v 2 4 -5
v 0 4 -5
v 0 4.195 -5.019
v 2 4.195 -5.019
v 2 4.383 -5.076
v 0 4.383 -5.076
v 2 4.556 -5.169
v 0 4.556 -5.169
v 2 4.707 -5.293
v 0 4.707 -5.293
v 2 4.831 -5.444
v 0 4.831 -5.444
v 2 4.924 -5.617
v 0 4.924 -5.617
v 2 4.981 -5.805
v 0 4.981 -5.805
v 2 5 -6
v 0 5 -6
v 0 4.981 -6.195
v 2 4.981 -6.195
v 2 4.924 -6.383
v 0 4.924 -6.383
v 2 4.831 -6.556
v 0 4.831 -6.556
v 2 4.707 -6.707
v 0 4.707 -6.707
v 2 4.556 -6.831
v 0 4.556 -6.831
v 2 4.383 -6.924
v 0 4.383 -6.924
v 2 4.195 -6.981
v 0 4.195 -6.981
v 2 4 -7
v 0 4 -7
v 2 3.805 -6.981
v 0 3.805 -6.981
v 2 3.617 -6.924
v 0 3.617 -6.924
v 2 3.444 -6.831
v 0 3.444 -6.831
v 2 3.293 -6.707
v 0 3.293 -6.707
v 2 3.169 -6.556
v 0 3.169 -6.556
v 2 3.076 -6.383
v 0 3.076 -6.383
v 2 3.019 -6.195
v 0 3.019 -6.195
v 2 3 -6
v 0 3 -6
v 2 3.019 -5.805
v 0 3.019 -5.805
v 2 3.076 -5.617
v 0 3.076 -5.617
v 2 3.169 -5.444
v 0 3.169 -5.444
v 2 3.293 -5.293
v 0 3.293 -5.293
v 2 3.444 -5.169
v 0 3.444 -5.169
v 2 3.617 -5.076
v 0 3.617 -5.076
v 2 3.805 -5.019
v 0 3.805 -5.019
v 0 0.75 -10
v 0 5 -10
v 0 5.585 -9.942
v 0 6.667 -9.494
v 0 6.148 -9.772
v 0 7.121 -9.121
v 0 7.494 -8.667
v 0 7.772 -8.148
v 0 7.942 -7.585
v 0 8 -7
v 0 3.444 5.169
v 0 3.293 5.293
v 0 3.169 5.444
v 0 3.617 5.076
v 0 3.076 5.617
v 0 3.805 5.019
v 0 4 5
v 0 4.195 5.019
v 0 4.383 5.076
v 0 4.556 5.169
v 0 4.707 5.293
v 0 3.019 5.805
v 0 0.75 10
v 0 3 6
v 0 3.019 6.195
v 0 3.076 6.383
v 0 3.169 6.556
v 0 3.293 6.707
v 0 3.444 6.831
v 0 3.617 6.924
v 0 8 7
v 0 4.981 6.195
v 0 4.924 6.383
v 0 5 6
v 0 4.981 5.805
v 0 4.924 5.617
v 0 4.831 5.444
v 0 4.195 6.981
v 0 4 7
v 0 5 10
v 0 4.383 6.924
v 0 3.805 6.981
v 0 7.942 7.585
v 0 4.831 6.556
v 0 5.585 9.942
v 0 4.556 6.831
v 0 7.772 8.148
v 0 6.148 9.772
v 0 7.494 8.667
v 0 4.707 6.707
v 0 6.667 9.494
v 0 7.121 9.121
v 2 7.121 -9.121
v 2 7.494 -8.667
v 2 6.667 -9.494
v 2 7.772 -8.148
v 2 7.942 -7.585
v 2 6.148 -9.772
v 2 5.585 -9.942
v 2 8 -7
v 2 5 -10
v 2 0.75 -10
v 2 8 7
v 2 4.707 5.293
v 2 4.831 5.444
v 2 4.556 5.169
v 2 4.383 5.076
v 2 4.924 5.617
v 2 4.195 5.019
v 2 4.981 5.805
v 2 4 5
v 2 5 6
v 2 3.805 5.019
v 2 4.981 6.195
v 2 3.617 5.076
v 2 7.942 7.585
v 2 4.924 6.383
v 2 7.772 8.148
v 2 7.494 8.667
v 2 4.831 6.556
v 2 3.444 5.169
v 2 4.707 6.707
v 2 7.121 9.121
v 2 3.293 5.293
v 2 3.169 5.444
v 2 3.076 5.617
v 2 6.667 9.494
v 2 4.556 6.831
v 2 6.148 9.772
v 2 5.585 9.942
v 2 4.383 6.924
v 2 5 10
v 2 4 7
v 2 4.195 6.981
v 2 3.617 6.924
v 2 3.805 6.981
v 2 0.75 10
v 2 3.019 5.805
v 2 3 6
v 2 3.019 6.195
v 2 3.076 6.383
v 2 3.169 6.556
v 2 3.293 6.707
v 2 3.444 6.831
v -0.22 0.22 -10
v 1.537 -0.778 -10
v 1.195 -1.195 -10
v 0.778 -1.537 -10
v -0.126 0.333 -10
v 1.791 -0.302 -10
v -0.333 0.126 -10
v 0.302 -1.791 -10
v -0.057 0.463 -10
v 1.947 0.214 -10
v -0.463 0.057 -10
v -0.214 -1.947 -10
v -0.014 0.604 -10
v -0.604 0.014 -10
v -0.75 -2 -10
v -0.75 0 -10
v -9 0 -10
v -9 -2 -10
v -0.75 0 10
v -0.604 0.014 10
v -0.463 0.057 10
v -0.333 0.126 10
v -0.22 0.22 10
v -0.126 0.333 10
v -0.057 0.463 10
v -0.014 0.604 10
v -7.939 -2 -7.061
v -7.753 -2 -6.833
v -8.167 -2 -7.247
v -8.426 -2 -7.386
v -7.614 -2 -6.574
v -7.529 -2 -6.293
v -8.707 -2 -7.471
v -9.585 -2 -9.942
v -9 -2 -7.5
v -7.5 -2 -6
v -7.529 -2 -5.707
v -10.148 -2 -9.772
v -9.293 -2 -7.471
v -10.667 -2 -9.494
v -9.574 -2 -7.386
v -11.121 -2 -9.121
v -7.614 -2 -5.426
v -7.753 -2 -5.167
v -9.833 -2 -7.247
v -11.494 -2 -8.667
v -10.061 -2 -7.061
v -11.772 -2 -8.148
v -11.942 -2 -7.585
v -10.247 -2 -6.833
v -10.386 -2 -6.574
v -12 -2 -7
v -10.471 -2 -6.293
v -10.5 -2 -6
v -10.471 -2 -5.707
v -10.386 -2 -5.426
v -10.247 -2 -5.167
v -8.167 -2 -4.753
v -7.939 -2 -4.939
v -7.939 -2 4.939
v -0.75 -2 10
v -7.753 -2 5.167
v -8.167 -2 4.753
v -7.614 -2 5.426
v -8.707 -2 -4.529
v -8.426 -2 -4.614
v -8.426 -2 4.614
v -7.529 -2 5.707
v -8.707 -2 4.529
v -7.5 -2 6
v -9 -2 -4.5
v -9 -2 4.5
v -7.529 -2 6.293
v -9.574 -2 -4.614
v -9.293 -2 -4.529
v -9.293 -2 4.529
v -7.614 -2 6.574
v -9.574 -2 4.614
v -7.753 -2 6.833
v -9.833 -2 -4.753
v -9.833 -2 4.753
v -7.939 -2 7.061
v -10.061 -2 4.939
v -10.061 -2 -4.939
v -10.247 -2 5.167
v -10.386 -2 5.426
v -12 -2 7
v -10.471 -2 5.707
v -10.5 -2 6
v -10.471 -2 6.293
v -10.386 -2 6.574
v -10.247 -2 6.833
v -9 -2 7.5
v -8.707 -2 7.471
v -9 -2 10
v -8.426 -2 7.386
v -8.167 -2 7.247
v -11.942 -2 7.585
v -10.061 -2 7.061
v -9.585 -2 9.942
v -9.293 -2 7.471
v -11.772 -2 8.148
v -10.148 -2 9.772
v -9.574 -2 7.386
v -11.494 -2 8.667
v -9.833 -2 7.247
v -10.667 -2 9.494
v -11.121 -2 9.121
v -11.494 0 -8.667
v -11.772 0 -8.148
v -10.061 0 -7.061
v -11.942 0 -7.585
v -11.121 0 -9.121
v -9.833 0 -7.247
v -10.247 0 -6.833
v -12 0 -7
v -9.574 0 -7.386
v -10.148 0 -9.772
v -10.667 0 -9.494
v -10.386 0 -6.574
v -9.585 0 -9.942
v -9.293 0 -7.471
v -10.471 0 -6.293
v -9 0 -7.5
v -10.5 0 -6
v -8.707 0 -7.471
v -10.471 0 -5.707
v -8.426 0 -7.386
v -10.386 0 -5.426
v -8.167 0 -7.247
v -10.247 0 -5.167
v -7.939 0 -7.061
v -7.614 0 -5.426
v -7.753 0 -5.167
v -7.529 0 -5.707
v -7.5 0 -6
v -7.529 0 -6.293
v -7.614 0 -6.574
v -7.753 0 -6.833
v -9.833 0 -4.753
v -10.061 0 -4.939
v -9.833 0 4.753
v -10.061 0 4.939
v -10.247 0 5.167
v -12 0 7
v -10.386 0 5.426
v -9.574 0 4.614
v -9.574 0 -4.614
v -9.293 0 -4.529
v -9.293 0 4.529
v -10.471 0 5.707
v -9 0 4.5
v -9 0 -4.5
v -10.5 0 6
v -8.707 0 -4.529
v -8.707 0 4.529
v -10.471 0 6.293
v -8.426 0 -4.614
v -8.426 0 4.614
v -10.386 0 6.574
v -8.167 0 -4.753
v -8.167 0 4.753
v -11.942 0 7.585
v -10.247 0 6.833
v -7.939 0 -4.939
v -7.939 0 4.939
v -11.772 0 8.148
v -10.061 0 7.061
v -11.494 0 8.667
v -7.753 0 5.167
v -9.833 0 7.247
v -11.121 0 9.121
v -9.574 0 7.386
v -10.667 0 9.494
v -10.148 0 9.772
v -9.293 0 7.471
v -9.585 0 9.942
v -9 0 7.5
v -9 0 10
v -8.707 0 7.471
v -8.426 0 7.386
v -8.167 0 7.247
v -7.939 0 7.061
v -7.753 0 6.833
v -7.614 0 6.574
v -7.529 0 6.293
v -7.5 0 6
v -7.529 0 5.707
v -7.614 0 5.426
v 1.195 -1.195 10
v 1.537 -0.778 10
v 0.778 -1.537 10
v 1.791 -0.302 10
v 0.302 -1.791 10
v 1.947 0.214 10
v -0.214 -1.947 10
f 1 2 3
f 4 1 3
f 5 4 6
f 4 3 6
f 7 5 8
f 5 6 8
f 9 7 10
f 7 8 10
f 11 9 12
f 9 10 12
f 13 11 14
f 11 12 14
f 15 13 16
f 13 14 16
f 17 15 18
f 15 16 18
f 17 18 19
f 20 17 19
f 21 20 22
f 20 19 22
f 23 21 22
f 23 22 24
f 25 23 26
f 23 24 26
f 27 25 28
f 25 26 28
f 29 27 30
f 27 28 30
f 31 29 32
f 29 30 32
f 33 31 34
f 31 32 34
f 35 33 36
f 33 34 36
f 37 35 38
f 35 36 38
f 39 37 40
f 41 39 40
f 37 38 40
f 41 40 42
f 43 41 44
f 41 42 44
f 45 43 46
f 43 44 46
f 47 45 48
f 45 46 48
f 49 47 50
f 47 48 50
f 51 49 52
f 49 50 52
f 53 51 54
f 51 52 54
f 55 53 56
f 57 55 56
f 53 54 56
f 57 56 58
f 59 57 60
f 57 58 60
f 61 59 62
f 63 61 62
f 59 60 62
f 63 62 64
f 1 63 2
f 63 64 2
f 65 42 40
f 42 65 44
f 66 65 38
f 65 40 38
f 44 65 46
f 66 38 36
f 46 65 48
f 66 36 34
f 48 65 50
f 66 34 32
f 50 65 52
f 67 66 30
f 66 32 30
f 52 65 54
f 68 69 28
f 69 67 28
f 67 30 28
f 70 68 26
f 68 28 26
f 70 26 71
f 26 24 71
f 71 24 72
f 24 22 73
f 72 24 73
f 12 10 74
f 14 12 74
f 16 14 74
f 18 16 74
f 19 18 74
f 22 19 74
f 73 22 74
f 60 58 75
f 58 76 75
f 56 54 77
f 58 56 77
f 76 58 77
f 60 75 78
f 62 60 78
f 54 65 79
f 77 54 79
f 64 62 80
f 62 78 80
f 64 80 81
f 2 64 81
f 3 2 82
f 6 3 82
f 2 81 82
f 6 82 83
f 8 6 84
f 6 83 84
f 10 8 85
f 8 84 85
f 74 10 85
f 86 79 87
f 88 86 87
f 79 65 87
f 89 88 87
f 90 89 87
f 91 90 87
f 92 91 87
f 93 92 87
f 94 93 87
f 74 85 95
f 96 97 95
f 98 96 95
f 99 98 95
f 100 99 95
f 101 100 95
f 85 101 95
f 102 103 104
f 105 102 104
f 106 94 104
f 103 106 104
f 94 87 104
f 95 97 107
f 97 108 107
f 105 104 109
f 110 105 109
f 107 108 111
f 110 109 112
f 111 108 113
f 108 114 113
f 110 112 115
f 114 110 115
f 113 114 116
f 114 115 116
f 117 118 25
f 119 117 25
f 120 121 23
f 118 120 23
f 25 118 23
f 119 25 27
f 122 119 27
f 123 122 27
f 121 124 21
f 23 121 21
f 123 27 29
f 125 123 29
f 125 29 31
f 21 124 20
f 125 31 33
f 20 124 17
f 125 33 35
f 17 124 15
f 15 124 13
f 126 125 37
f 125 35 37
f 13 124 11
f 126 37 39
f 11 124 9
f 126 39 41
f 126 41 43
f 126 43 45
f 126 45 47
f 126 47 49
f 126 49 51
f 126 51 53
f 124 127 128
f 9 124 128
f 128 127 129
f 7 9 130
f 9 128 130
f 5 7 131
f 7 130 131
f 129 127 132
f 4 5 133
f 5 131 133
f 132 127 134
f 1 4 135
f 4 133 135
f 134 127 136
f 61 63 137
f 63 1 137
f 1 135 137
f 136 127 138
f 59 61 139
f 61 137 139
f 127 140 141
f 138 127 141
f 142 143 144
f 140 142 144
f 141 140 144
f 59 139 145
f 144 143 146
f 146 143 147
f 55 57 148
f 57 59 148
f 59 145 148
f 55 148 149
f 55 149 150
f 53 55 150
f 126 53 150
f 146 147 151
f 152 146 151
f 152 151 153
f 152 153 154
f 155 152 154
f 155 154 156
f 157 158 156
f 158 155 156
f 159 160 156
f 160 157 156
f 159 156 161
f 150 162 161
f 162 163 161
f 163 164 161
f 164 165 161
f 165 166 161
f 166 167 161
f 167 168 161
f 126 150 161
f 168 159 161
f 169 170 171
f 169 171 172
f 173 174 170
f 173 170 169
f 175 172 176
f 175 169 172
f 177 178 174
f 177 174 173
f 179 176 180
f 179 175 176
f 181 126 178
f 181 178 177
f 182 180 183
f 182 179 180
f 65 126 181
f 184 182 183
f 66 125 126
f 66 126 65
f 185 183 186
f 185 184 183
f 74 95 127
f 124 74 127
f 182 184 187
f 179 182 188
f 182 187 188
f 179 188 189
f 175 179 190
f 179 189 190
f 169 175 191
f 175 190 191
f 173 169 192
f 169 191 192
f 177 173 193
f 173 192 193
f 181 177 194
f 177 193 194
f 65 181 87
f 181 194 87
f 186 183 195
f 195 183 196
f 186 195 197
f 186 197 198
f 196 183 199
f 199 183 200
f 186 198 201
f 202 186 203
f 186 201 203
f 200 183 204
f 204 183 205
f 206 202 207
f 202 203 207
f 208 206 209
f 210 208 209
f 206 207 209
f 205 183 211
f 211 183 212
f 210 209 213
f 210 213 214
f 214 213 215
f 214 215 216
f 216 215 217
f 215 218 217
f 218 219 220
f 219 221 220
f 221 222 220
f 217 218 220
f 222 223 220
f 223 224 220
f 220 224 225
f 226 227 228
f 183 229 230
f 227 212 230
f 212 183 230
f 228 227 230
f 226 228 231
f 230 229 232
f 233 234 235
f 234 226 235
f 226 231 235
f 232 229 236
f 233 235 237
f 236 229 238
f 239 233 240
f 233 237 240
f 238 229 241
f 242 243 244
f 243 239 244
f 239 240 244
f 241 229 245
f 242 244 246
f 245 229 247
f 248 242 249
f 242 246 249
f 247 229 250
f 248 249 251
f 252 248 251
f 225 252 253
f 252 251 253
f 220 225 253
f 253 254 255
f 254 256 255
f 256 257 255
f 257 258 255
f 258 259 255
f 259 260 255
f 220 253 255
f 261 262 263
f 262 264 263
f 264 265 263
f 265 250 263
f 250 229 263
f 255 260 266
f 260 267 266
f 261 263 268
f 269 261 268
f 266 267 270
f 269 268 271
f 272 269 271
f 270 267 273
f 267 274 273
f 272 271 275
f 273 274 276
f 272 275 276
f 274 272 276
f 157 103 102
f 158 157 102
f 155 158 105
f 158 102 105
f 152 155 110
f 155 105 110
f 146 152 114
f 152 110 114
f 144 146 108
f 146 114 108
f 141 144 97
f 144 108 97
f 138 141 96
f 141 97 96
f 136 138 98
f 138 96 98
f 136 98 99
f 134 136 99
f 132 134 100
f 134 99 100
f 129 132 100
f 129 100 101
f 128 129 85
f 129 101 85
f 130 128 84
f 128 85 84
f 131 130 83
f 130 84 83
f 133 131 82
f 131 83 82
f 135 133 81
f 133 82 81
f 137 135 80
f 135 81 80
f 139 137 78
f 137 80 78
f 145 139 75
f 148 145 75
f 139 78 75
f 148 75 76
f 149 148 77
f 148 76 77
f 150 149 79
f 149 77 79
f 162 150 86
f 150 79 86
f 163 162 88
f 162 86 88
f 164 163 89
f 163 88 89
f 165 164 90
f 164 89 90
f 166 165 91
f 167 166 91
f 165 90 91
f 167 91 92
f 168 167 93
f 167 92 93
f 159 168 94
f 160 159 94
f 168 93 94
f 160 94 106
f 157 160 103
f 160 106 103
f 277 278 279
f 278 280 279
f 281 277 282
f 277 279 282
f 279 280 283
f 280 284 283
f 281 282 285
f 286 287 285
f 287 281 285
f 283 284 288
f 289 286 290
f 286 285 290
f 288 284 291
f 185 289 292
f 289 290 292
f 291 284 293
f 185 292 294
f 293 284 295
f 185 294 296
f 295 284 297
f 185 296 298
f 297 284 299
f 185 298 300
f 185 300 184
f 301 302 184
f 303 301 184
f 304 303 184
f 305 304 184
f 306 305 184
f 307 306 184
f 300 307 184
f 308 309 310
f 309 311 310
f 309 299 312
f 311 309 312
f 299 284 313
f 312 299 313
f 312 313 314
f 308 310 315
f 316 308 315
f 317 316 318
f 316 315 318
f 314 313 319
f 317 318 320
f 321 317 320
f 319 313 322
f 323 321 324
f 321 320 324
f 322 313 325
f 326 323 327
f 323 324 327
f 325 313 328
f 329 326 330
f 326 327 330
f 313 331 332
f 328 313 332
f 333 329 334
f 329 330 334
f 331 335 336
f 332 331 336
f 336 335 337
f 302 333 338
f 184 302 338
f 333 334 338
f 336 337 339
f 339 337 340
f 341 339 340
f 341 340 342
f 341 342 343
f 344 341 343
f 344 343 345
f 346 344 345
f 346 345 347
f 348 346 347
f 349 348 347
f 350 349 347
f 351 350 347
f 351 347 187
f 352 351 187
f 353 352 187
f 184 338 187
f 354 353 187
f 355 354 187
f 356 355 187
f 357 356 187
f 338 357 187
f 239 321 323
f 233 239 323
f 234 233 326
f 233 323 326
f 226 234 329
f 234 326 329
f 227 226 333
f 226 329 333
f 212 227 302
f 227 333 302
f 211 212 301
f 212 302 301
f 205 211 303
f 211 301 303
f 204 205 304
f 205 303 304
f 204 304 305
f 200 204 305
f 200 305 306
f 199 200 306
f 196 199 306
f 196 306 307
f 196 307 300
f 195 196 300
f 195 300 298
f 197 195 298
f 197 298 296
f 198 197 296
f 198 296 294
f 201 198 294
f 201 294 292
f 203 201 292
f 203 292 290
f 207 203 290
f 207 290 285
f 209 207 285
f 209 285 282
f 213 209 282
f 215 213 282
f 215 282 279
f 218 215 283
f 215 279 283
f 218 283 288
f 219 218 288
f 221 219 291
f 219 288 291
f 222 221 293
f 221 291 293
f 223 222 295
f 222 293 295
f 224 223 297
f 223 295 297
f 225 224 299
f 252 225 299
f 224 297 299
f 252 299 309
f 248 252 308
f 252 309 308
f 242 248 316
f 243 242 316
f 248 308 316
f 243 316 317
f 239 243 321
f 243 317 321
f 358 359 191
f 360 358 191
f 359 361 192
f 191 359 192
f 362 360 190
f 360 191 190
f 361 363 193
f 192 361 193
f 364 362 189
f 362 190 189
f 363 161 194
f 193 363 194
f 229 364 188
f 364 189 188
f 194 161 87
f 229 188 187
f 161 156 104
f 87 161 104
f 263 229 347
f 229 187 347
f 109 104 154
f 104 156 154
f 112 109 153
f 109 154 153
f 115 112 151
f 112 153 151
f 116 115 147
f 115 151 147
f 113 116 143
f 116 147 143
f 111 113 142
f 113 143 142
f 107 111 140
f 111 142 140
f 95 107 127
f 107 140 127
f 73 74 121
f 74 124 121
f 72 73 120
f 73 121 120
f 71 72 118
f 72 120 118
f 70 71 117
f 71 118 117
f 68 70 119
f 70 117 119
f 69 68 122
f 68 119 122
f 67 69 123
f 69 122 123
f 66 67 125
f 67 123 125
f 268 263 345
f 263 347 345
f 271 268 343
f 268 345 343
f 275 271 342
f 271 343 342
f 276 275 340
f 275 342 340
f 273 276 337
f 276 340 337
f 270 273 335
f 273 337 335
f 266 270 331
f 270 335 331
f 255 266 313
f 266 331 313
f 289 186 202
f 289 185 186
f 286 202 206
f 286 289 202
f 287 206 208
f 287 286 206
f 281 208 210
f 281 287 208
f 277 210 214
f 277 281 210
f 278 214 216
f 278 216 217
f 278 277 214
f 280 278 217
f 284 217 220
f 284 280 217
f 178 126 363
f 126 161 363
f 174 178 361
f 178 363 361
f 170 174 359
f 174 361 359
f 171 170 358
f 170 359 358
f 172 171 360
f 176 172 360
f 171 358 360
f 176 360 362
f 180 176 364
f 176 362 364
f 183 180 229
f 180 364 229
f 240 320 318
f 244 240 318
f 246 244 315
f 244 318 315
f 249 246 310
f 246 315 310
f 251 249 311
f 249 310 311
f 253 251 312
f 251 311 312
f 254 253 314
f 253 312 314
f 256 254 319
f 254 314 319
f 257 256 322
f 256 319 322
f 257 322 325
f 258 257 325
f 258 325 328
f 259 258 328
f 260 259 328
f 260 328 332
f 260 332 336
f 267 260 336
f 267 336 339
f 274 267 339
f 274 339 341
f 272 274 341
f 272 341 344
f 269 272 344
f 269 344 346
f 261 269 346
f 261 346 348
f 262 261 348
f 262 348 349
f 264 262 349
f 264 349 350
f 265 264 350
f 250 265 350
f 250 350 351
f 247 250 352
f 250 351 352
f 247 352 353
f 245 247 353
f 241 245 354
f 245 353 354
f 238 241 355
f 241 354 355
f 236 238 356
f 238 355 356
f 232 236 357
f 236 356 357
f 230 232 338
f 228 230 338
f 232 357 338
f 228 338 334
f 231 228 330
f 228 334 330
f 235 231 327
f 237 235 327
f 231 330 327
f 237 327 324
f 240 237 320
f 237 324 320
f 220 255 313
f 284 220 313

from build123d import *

# Parameters (mm, degrees)
BASE_FLANGE1_DEPTH = 10
FILLET1_R          = 3
SKETCH6_R          = 1.5
CUT_EXTRUDE1_DEPTH = 18.549928775
SKETCH11_R         = 1
CUT_EXTRUDE2_DEPTH = 2


# Sheet-metal steps are written as plain solids
with BuildPart() as part:
    # Sketch1 → Base-Flange1 (new, symmetric)
    with BuildSketch(Plane.XY):
        with BuildLine():
            Line((-12, 0), (-0.75, 0))
            ThreePointArc((-0.75, 0), (-0.219669914, 0.219669914), (0, 0.75))
            Line((0, 0.75), (0, 8))
            Line((0, 8), (2, 8))
            Line((2, 8), (2, 0.75))
            ThreePointArc((2, 0.75), (1.194543648, -1.194543648), (-0.75, -2))
            Line((-0.75, -2), (-12, -2))
            Line((-12, -2), (-12, 0))
        make_face()
    extrude(amount=BASE_FLANGE1_DEPTH, both=True)

    # Fillet1
    fillet1_edges = [part.edges().sort_by_distance(p)[0] for p in [
        (-12, -1, 10),
        (-12, -1, -10),
        (1, 8, 10),
        (1, 8, -10),
    ]]
    fillet(fillet1_edges, radius=FILLET1_R)

    # Sketch6 → Cut-Extrude1 (cut, through all)
    with BuildSketch(Plane(origin=(0, 0, 0), x_dir=(1, 0, 0), z_dir=(0, 1, 0))):
        with Locations(Location((-9, 6, 0), (0, 0, 270))):
            Circle(SKETCH6_R)
        with Locations(Location((-9, -6, 0), (0, 0, 90))):
            Circle(SKETCH6_R)
    extrude(amount=-CUT_EXTRUDE1_DEPTH, mode=Mode.SUBTRACT)

    # Sketch11 → Cut-Extrude2 (cut)
    with BuildSketch(Plane.ZY):
        with Locations((6, 4)):
            Circle(SKETCH11_R)
        with Locations((-6, 4)):
            Circle(SKETCH11_R)
    extrude(amount=-CUT_EXTRUDE2_DEPTH, mode=Mode.SUBTRACT)


solid = part.part
